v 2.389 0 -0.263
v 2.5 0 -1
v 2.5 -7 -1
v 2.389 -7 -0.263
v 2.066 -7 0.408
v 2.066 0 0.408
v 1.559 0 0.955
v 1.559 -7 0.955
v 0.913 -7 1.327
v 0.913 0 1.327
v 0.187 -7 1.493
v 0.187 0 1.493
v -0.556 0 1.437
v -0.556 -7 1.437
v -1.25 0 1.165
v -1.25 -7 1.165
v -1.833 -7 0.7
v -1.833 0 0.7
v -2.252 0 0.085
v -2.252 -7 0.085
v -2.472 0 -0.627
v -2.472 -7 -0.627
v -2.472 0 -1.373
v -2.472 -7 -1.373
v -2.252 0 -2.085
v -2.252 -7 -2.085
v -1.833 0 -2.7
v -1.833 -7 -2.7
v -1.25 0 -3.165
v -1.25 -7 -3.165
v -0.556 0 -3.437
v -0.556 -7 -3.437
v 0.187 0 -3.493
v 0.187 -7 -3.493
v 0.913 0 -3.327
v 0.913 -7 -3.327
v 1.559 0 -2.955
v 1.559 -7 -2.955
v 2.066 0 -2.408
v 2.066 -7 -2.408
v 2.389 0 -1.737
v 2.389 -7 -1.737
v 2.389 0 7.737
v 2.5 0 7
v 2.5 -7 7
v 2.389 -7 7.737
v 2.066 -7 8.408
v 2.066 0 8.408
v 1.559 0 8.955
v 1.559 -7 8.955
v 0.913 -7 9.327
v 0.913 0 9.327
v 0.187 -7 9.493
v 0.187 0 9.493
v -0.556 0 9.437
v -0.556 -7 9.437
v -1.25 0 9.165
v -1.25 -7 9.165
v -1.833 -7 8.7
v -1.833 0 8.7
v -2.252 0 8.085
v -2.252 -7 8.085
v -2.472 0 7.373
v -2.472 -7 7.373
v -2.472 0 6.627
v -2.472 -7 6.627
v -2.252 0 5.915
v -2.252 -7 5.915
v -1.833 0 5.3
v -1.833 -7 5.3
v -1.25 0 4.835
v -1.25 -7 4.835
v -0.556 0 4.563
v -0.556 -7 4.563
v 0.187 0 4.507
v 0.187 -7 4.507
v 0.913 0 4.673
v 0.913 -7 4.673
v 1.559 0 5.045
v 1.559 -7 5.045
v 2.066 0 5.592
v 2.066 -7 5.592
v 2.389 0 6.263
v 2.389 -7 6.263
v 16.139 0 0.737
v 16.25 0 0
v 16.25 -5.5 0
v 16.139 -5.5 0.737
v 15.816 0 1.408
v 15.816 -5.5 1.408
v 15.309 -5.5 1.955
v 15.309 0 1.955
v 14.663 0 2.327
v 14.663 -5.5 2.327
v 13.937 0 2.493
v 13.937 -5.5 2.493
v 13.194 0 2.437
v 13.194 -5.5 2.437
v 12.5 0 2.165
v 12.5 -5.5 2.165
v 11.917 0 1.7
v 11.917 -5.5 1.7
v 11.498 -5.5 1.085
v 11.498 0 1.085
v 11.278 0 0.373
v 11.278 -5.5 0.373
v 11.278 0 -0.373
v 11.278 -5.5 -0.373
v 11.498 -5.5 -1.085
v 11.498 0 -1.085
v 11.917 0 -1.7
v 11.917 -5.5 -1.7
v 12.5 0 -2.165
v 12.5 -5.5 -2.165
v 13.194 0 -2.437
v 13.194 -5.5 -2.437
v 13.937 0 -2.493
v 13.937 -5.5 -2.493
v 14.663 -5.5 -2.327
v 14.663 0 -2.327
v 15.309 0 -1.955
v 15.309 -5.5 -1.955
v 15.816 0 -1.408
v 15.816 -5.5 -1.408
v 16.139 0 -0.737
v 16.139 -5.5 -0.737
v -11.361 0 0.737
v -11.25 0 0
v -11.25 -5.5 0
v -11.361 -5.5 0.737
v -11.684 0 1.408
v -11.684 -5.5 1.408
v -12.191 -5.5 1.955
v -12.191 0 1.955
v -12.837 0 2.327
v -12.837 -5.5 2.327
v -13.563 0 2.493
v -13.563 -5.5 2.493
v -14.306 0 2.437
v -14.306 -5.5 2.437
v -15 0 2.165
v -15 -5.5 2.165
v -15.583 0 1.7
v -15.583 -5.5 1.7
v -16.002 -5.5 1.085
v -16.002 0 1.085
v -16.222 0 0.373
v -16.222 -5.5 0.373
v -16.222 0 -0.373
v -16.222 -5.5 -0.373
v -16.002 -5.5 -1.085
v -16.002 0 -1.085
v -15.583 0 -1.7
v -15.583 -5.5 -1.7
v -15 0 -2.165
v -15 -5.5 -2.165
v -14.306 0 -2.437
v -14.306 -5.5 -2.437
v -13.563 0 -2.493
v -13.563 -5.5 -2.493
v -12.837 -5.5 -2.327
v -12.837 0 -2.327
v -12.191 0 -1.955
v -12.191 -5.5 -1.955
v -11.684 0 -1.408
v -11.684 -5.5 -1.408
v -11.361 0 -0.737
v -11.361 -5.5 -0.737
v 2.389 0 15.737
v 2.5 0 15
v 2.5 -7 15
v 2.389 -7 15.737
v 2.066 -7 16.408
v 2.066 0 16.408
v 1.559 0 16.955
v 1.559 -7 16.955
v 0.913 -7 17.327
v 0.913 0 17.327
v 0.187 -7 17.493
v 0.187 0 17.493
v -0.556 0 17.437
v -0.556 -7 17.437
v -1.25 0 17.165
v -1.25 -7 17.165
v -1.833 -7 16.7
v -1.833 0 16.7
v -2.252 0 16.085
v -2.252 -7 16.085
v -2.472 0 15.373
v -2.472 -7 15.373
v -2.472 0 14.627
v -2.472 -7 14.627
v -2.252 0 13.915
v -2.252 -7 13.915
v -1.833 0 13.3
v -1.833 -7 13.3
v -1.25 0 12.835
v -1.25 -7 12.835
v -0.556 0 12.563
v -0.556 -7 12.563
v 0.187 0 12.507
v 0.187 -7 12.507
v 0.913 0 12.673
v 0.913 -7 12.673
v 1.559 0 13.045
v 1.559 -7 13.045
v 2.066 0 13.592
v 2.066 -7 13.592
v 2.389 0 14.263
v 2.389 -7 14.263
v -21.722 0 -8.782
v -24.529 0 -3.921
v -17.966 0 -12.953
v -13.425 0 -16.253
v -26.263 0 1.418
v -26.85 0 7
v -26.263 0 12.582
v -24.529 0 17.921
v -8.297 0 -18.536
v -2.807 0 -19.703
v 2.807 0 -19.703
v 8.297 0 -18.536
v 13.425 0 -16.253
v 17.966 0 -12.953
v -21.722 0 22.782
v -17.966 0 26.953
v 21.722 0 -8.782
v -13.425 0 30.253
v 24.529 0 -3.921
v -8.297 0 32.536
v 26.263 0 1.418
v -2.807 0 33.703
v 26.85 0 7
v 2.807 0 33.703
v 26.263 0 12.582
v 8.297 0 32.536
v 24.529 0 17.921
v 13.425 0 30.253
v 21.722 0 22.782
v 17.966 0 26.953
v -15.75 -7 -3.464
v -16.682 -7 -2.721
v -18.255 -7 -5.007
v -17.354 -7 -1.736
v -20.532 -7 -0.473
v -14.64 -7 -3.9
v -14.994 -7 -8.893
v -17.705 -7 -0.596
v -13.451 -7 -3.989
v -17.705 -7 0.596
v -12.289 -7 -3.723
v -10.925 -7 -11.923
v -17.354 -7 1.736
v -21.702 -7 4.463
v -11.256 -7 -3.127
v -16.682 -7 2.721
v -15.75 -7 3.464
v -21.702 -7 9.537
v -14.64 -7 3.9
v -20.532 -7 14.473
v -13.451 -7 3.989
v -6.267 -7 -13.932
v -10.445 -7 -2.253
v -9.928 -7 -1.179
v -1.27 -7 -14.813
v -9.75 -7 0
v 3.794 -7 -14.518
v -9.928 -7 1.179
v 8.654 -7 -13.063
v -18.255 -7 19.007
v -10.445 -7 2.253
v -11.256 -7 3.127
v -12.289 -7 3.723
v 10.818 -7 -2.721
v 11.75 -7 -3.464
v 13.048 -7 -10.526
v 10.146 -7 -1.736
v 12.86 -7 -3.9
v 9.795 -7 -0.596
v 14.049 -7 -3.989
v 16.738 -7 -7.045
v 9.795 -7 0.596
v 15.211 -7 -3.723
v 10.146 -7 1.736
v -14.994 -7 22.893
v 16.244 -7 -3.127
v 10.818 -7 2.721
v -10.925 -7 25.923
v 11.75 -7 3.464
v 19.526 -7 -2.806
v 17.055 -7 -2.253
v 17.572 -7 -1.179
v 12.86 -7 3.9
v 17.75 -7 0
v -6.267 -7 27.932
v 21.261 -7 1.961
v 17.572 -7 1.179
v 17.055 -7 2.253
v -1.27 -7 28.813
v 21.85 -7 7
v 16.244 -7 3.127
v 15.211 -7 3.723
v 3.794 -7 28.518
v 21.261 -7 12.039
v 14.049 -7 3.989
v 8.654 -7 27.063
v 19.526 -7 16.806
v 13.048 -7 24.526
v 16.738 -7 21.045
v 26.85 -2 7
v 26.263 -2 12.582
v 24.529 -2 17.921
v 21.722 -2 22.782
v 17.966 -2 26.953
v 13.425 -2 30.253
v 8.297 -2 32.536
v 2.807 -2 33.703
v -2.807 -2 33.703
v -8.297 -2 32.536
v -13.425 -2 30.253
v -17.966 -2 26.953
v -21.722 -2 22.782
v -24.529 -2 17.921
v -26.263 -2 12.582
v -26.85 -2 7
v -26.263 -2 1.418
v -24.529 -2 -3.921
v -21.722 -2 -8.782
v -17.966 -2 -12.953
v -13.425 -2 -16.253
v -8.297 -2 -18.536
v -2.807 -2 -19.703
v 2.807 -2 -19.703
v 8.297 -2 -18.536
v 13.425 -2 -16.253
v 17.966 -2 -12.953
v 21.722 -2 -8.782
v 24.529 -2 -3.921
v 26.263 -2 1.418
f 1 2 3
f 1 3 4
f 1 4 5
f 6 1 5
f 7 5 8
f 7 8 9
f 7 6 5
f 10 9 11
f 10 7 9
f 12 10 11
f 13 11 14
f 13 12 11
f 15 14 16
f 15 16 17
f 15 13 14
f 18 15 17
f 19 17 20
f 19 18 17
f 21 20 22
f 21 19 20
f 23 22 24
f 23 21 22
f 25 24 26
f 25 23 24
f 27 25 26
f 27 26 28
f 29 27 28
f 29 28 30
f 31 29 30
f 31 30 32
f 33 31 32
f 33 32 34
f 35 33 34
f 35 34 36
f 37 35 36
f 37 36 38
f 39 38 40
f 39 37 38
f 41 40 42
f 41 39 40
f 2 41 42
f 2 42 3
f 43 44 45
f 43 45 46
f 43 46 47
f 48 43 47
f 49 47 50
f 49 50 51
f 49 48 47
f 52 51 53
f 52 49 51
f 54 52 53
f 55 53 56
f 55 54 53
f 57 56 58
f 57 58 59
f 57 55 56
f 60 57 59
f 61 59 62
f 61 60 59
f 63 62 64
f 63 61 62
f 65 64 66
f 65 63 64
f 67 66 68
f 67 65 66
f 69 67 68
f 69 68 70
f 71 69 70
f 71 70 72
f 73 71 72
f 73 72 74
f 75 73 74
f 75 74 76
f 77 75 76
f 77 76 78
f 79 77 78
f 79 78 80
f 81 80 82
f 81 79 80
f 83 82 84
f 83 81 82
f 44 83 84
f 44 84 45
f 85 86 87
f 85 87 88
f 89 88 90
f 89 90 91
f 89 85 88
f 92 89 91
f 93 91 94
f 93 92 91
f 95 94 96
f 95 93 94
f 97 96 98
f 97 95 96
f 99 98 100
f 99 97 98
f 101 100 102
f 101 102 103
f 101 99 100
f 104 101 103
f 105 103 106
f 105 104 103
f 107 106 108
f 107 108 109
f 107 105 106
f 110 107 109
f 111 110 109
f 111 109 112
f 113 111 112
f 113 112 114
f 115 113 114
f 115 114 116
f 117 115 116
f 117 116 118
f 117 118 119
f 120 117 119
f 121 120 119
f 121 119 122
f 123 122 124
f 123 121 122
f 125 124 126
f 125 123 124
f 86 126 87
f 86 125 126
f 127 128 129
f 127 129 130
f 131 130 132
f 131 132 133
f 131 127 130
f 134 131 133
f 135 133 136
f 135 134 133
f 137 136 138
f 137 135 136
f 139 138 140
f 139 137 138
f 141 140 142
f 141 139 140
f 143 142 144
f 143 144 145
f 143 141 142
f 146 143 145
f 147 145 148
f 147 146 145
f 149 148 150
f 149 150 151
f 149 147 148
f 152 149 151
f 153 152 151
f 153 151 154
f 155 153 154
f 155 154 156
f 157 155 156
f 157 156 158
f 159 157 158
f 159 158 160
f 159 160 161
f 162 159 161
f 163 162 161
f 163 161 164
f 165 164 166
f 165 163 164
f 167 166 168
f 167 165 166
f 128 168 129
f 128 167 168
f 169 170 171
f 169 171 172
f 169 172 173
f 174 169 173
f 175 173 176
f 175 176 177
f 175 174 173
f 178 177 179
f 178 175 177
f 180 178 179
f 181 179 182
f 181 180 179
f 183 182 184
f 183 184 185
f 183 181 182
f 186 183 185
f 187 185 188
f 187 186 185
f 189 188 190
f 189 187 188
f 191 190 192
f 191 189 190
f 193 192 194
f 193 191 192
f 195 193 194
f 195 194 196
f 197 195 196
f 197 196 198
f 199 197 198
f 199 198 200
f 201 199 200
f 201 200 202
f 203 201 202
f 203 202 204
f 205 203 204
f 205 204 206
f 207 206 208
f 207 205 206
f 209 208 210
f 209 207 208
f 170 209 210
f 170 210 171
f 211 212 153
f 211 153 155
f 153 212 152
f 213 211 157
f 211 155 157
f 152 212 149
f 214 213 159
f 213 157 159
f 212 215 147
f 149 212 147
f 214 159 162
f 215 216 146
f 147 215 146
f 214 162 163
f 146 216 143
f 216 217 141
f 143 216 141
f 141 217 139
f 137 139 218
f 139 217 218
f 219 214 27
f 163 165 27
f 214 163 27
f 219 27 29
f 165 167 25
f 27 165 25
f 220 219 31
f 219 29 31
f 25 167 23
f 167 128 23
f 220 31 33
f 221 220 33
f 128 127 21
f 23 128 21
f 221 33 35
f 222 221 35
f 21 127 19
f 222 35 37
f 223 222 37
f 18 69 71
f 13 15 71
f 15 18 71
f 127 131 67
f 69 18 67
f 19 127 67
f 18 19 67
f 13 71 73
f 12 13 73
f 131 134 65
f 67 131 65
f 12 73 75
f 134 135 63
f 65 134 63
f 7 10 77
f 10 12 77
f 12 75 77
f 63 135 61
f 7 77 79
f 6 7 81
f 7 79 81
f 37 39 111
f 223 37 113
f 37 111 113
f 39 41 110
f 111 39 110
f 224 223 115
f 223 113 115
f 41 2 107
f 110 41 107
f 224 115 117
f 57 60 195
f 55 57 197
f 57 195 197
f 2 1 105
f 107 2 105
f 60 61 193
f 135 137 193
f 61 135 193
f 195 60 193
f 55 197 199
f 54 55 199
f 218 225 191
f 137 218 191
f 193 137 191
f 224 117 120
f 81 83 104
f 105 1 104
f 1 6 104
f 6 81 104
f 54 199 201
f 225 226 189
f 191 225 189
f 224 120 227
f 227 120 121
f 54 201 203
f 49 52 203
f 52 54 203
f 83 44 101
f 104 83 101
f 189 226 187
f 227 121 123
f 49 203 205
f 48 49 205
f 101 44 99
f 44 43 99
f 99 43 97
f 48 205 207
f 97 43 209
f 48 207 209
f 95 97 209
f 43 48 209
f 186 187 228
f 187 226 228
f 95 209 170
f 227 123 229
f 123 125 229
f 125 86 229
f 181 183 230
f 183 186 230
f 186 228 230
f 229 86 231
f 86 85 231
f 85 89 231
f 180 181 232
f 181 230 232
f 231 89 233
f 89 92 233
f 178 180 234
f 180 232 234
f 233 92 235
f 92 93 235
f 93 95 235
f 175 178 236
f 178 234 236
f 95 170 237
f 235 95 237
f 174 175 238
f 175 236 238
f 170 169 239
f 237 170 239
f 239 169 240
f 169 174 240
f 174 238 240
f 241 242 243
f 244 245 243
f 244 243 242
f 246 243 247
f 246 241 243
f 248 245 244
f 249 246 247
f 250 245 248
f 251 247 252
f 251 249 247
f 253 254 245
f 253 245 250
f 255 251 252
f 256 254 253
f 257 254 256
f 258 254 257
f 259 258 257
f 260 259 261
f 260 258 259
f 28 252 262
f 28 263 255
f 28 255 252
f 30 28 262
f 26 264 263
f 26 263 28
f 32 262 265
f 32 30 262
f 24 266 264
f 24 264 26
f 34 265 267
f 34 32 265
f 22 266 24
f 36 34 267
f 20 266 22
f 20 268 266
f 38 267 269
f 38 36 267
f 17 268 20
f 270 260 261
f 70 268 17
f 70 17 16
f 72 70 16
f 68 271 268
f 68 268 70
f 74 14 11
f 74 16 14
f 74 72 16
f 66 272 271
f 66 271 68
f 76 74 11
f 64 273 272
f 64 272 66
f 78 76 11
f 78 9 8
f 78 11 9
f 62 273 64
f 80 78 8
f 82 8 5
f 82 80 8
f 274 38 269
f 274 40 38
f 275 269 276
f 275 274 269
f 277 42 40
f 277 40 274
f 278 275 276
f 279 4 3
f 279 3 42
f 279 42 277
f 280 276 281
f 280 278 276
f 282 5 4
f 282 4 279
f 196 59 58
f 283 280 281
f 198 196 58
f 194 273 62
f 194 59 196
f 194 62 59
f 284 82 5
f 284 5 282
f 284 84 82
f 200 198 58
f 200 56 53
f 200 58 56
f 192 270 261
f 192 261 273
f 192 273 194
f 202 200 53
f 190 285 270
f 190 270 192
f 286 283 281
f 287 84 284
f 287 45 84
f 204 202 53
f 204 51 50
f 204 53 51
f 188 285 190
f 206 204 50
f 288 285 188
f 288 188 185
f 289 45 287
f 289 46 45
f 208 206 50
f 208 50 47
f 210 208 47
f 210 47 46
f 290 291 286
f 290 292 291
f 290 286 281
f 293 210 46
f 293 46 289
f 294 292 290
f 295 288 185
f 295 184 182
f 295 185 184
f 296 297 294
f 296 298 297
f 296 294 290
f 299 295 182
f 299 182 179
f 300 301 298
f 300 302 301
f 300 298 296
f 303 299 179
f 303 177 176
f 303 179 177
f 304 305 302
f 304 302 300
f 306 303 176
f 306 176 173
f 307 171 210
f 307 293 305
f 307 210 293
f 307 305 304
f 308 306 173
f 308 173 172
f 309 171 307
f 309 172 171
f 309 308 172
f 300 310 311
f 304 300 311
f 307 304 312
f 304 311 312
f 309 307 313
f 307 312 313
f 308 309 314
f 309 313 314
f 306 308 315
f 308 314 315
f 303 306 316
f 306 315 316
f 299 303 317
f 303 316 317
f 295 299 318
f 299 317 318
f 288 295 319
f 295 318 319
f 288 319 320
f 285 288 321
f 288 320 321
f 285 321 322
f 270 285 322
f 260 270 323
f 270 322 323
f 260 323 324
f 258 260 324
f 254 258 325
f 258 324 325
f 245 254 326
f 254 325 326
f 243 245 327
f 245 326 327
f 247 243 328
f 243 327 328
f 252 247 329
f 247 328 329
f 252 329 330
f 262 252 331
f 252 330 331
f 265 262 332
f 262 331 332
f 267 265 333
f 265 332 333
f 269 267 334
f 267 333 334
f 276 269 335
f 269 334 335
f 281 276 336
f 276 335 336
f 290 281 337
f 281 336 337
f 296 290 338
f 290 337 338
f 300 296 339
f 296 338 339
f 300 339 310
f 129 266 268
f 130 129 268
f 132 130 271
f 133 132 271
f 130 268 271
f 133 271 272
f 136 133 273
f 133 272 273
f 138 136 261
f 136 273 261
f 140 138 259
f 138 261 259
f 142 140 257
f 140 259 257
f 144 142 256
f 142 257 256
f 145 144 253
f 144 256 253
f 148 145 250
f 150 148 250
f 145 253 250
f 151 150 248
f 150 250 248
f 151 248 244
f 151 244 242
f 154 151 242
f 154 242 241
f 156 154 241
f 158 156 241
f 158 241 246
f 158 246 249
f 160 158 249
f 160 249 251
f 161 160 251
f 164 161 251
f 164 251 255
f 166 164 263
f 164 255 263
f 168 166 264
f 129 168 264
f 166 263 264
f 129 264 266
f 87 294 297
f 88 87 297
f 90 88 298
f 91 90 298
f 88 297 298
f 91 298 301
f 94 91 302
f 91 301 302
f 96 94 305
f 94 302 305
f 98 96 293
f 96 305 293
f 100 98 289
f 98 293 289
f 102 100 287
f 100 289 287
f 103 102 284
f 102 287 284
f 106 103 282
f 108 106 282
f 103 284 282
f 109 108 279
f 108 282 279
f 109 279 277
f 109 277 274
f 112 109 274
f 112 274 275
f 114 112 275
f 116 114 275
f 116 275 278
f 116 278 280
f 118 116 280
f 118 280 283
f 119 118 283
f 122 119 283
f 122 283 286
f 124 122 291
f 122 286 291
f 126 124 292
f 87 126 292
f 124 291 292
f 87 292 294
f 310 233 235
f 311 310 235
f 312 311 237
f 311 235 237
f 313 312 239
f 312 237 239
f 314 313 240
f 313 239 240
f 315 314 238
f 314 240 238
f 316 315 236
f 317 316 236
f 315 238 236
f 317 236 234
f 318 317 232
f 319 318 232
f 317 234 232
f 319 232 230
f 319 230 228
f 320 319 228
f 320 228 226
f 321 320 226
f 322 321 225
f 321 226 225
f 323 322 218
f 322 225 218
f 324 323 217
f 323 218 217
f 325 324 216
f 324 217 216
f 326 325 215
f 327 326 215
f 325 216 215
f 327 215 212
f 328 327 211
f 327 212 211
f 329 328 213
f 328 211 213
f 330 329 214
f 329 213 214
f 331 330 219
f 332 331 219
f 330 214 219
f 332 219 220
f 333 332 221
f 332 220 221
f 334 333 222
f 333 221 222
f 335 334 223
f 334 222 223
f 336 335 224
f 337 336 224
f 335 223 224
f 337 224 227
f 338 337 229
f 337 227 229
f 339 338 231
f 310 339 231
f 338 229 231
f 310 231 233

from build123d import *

# Parameters (mm, degrees)
F0_R     = 26.85
F0_R_2   = 2.5
F1_DEPTH = 7
F2_SIZE  = 1.5
F3_SIZE  = 5


with BuildPart() as f1:
    # F0 (on Front) → F1 (new body)
    with BuildSketch(Plane.XZ):
        with Locations((0, 7)):
            Circle(F0_R)
        with Locations((-13.75, 0)):
            Circle(F0_R_2, mode=Mode.SUBTRACT)
        with Locations((0, -1)):
            Circle(F0_R_2, mode=Mode.SUBTRACT)
        with Locations((0, 7)):
            Circle(F0_R_2, mode=Mode.SUBTRACT)
        with Locations((13.75, 0)):
            Circle(F0_R_2, mode=Mode.SUBTRACT)
        with Locations((0, 15)):
            Circle(F0_R_2, mode=Mode.SUBTRACT)
    extrude(amount=F1_DEPTH)

    # F2
    f2_edges = [f1.edges().sort_by_distance(p)[0] for p in [
        (-16.25, -7, 0),
        (11.25, -7, 0),
    ]]
    chamfer(f2_edges, length=F2_SIZE)

    # F3
    f3_edges = [f1.edges().sort_by_distance(p)[0] for p in [
        (-26.85, -7, 7),
    ]]
    chamfer(f3_edges, length=F3_SIZE)


solid = f1.part
